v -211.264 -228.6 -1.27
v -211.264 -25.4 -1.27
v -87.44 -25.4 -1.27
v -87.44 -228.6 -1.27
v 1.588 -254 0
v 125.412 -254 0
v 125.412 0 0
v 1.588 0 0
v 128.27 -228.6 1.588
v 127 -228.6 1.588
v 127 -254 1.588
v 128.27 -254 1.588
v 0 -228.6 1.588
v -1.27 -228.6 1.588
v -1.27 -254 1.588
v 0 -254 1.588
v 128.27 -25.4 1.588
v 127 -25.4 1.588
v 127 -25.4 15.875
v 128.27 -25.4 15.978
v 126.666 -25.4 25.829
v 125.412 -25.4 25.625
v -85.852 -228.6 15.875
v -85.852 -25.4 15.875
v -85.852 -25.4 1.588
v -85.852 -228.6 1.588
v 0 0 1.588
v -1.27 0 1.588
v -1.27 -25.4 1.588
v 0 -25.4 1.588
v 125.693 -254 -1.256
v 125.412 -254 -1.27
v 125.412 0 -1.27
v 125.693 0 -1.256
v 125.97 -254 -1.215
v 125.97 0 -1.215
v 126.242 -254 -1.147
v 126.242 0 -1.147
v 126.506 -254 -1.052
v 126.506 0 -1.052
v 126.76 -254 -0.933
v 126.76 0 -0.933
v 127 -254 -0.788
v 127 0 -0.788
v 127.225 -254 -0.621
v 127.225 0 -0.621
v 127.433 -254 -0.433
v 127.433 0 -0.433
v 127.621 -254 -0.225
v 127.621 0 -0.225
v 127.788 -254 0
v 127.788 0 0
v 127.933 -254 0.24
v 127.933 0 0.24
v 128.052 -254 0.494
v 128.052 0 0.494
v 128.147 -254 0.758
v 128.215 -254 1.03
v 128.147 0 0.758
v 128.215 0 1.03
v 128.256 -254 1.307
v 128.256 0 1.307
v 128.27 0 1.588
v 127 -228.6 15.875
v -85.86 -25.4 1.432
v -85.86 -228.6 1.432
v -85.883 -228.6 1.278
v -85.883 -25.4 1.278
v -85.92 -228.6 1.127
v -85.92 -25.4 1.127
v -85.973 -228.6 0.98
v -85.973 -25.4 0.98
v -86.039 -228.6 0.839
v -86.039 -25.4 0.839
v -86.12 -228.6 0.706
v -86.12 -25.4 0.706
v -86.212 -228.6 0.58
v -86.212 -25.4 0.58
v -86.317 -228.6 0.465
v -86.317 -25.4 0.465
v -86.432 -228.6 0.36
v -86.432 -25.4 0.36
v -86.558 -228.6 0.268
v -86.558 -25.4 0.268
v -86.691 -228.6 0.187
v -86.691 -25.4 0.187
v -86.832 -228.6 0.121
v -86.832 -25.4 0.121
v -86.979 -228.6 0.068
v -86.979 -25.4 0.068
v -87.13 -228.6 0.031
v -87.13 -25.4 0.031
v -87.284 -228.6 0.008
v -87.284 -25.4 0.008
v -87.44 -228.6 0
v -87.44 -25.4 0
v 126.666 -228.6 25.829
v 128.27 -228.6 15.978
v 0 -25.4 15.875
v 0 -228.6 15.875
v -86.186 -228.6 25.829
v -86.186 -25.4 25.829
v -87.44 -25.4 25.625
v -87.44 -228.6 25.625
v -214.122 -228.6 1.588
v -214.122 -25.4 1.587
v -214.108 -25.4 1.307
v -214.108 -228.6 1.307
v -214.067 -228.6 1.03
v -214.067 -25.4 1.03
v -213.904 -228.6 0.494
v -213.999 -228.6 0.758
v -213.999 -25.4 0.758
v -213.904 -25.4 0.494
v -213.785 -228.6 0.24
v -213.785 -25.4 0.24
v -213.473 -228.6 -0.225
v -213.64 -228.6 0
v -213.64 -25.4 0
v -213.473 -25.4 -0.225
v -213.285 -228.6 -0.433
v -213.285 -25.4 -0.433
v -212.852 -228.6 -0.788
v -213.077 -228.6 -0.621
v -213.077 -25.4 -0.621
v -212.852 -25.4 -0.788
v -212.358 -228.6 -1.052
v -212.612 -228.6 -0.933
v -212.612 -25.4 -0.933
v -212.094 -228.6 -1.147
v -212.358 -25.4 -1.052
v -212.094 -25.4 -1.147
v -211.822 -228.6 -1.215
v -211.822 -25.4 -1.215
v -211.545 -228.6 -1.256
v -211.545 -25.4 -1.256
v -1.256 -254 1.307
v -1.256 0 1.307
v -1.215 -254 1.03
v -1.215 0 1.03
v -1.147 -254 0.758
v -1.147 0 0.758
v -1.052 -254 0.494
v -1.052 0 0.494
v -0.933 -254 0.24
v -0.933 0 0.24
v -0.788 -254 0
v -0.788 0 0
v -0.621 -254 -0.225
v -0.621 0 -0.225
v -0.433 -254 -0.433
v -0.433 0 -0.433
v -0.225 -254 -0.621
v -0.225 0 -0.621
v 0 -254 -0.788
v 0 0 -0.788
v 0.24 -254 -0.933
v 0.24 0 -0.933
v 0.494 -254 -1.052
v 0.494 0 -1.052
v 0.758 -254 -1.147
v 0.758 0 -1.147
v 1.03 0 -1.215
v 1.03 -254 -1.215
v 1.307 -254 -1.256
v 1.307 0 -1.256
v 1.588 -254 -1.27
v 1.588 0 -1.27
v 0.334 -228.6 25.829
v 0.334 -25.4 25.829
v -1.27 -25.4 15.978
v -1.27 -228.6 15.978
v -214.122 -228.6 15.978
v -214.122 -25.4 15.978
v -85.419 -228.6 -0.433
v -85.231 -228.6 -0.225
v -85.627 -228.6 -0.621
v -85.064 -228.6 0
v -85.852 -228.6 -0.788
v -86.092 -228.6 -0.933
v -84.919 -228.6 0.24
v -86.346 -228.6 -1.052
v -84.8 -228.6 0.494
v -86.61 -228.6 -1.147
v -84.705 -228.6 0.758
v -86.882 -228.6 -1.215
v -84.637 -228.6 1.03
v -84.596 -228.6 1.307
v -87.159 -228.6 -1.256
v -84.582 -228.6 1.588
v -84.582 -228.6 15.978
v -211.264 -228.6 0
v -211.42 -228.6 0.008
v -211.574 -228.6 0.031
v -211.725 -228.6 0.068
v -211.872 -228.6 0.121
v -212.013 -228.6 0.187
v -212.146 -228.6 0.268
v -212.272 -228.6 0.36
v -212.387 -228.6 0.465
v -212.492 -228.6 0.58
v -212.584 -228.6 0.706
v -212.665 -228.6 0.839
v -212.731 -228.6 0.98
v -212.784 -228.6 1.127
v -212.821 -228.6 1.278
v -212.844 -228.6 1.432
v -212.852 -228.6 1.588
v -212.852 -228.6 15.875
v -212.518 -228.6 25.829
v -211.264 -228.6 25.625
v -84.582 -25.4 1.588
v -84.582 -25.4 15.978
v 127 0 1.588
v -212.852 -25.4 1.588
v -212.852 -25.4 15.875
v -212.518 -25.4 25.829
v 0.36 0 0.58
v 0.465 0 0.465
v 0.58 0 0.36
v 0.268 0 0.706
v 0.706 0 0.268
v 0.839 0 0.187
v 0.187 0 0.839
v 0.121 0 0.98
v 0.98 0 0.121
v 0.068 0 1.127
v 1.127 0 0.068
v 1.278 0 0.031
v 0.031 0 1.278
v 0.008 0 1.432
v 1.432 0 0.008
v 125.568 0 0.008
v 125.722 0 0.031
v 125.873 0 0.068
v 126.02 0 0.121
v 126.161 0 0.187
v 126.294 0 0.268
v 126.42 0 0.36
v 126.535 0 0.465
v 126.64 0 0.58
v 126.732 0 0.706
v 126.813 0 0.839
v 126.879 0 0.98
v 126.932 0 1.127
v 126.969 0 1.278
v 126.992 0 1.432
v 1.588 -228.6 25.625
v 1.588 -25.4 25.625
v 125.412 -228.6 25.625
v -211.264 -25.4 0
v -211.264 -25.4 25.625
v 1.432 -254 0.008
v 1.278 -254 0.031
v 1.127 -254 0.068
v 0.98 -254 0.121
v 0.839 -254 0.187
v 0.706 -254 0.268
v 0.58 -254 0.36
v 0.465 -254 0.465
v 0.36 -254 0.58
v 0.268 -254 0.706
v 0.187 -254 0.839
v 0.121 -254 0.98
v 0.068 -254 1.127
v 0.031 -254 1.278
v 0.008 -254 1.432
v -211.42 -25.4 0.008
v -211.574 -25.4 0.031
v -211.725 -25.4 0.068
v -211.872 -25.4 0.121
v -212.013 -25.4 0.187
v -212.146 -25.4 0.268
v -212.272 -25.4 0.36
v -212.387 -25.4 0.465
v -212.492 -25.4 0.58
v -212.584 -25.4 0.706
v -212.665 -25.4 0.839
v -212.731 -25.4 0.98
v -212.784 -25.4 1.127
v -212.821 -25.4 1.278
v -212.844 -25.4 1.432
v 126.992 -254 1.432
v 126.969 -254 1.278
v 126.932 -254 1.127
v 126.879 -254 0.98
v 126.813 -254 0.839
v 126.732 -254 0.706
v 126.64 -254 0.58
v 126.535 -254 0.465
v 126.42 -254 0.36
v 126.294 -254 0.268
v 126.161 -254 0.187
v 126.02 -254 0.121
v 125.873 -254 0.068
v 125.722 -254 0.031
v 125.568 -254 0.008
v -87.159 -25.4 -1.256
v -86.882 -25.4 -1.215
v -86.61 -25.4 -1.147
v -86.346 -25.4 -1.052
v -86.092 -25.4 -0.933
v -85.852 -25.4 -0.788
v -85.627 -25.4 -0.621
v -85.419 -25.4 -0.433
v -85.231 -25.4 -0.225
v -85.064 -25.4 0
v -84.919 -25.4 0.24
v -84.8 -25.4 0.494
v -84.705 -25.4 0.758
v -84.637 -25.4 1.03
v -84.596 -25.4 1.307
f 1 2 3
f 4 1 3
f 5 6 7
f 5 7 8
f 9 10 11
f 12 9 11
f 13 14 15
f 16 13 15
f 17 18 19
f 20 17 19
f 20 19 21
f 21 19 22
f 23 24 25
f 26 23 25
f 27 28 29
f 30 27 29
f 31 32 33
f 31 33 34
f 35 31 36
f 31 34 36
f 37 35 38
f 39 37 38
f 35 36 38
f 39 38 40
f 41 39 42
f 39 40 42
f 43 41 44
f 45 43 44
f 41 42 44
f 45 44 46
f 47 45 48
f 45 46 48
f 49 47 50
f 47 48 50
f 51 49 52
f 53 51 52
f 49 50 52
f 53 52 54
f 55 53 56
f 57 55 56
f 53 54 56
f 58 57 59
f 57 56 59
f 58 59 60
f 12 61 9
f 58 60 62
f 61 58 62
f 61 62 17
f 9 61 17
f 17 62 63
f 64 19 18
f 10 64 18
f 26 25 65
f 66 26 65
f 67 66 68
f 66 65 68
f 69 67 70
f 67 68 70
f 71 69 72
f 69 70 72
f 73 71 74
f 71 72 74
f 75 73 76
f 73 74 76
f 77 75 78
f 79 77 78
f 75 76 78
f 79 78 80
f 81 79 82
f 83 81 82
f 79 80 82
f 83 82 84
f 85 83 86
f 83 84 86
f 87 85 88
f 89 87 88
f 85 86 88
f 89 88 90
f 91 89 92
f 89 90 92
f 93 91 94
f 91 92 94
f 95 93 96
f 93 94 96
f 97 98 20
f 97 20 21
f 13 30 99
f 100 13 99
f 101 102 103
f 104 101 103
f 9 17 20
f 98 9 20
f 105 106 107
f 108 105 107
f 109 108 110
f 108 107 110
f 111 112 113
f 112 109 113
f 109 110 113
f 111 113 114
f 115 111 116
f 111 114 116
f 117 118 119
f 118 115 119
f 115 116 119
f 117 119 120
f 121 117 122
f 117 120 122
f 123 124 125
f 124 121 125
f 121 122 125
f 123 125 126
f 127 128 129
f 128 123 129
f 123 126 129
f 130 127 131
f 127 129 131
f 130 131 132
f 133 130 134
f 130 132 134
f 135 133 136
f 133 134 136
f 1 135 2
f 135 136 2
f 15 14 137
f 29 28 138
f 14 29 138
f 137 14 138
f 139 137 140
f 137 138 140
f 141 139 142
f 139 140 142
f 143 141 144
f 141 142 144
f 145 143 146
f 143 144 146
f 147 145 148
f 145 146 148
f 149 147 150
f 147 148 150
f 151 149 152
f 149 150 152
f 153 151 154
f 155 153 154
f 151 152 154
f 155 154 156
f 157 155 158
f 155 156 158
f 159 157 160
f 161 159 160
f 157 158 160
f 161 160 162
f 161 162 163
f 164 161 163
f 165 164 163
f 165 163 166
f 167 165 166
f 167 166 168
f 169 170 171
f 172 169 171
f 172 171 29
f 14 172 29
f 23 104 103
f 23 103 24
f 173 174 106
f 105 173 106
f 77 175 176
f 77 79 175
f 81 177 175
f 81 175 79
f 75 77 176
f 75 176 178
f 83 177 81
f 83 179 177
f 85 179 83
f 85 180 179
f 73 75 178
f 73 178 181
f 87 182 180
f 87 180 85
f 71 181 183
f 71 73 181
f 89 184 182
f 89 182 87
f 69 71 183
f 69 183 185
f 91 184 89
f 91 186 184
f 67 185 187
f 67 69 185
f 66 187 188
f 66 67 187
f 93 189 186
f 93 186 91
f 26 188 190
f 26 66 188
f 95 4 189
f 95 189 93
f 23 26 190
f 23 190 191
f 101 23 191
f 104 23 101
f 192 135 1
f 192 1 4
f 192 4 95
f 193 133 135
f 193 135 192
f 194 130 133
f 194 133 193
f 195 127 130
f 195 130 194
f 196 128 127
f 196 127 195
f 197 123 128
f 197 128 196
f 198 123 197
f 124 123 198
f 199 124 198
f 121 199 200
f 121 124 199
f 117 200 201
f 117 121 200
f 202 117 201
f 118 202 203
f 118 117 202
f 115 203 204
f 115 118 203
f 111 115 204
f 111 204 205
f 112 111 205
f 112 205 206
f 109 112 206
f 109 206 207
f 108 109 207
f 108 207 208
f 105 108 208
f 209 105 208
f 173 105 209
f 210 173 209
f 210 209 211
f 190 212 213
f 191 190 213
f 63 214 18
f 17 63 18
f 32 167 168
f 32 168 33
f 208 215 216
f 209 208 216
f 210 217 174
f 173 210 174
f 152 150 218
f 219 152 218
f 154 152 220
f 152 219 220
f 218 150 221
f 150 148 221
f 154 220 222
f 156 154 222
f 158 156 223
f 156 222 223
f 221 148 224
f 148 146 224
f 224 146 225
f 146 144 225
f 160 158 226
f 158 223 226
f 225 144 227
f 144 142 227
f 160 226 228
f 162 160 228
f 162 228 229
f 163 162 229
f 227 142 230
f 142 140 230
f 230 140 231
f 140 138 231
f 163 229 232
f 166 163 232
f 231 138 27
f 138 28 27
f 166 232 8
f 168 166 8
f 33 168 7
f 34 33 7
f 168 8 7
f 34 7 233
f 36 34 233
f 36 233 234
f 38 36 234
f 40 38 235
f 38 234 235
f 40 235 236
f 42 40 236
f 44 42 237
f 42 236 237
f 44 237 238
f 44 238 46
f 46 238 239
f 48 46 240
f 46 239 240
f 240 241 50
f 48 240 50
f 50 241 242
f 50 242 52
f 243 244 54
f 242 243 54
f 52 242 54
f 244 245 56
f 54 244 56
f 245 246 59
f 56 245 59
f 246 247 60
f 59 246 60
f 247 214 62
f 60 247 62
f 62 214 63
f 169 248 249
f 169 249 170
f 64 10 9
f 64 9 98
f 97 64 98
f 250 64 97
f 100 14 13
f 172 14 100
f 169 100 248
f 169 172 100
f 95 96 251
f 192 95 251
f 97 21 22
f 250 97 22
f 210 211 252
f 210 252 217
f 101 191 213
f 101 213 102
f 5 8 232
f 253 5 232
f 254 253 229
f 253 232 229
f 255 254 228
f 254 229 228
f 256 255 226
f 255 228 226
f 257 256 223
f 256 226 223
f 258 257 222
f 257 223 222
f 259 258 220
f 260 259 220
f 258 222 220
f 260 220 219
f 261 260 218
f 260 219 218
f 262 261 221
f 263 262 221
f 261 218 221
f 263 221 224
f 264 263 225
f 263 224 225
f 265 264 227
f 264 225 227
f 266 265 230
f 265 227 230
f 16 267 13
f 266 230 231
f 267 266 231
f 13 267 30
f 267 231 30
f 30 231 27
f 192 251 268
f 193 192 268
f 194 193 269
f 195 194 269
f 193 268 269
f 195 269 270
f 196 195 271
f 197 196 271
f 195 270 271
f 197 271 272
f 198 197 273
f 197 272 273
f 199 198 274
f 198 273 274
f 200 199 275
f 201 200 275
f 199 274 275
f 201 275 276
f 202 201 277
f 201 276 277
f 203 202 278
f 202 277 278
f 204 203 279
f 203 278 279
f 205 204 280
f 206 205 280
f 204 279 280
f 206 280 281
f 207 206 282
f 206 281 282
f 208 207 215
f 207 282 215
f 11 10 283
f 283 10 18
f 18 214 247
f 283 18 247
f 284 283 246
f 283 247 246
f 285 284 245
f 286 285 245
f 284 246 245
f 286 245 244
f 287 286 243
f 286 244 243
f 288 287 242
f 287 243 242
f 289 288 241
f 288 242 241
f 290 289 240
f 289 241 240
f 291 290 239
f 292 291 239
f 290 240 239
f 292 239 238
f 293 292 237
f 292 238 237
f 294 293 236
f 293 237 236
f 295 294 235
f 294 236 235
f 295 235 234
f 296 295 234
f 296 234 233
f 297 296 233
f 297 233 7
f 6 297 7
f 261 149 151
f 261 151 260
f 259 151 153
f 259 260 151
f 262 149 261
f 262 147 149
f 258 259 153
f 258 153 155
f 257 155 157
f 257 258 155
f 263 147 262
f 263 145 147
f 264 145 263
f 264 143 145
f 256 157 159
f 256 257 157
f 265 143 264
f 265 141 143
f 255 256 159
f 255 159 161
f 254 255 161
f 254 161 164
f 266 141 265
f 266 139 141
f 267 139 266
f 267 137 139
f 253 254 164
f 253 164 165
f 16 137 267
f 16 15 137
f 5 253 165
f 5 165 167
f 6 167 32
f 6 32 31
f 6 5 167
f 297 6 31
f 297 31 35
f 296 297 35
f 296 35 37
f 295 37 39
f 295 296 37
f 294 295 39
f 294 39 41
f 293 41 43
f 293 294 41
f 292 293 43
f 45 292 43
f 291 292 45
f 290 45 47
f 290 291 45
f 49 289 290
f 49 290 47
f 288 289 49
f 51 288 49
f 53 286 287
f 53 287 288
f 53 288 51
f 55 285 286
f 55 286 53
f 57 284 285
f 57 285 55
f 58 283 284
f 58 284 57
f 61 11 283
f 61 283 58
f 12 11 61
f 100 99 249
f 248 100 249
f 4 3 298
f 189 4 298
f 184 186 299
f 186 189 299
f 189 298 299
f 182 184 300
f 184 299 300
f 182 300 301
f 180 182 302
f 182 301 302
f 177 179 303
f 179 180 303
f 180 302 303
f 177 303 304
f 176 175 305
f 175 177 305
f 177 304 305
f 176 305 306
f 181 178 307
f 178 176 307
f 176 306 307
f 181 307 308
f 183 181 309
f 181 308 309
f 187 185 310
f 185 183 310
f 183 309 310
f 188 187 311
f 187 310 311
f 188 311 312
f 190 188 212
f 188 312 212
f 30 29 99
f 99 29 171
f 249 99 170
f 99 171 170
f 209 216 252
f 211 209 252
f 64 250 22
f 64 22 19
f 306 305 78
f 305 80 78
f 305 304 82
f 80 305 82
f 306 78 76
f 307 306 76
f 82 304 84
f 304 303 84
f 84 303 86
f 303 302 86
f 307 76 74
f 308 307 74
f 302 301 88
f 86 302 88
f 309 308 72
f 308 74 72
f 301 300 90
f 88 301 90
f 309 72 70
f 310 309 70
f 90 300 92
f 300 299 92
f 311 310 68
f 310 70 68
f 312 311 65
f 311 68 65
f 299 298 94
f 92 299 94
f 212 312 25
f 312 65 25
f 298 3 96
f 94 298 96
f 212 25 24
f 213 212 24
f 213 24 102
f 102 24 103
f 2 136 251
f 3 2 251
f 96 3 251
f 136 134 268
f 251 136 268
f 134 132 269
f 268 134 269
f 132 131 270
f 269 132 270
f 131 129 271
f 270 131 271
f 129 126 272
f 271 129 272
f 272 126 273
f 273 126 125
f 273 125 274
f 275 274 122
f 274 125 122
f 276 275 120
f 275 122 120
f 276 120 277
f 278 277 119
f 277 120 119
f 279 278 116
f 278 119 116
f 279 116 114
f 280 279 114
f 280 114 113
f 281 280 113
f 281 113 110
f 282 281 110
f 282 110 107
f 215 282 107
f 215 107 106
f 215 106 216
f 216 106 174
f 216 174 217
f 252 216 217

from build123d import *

# Parameters (mm, degrees)
F1_DEPTH  = 254
F3_DEPTH  = 1.27
F5_DEPTH  = 1.27
F6_W      = 25.4
F6_H      = 24.2419116952
F7_DEPTH  = 129.541
F9_W      = 25.4
F9_H      = 3.5516537219
F9_W_2    = 25.5614472866
F9_H_2    = 3.244402954
F10_DEPTH = 342.393


with BuildPart() as f1:
    # F0 (on Front) → F1 (new body)
    with BuildSketch(Plane.XZ):
        with BuildLine():
            Line((0, 1.5875), (0, 15.875))
            Line((0, 15.875), (1.5875, 25.6253238767))
            Line((1.5875, 25.6253238767), (0.3340056193, 25.8294116952))
            Line((0.3340056193, 25.8294116952), (-1.27, 15.9777113559))
            Line((-1.27, 15.9777113559), (-1.27, 1.5875))
            ThreePointArc((-1.27, 1.5875), (-0.4330576272, -0.4330576272), (1.5875, -1.27))
            Line((1.5875, -1.27), (63.5, -1.27))
            Line((63.5, -1.27), (125.4125, -1.27))
            ThreePointArc((125.4125, -1.27), (127.4330576272, -0.4330576272), (128.27, 1.5875))
            Line((128.27, 1.5875), (128.27, 15.9777113559))
            Line((128.27, 15.9777113559), (126.6659943807, 25.8294116952))
            Line((126.6659943807, 25.8294116952), (125.4125, 25.6253238767))
            Line((125.4125, 25.6253238767), (127, 15.875))
            Line((127, 15.875), (127, 1.5875))
            ThreePointArc((127, 1.5875), (126.5350320151, 0.4649679849), (125.4125, 0))
            Line((125.4125, 0), (63.5, 0))
            Line((63.5, 0), (1.5875, 0))
            ThreePointArc((1.5875, 0), (0.4649679849, 0.4649679849), (0, 1.5875))
        make_face()
    extrude(amount=F1_DEPTH)

    # F2 (on face) → F3 (cut, through all)
    with BuildSketch(Plane(origin=(-3.7714366405, 0, 0.6140468504), x_dir=(0, -1, 0), z_dir=(-0.9870034493, 0, 0.1606990697))):
        with BuildLine():
            ThreePointArc((250.825, 25.5473928299), (253.0700640303, 24.6174568602), (254, 22.3723928299))
            Line((254, 22.3723928299), (254, 25.5473928299))
            Line((254, 25.5473928299), (250.825, 25.5473928299))
        make_face()
        with BuildLine():
            ThreePointArc((0, 22.3723928299), (0.9299359697, 24.6174568602), (3.175, 25.5473928299))
            Line((3.175, 25.5473928299), (0, 25.5473928299))
            Line((0, 25.5473928299), (0, 22.3723928299))
        make_face()
    extrude(amount=-F3_DEPTH, mode=Mode.SUBTRACT)

    # F4 (on face) → F5 (cut, through all)
    with BuildSketch(Plane(origin=(127.4917643851, 0, 20.7575849295), x_dir=(0, 1, 0), z_dir=(0.9870034493, 0, 0.1606990697))):
        with BuildLine():
            ThreePointArc((-254, 1.9636109837), (-253.0700640303, 4.208675014), (-250.825, 5.1386109837))
            Line((-250.825, 5.1386109837), (-254, 5.1386109837))
            Line((-254, 5.1386109837), (-254, 1.9636109837))
        make_face()
        with BuildLine():
            ThreePointArc((-3.175, 5.1386109837), (-0.9299359697, 4.208675014), (0, 1.9636109837))
            Line((0, 1.9636109837), (0, 5.1386109837))
            Line((0, 5.1386109837), (-3.175, 5.1386109837))
        make_face()
    extrude(amount=-F5_DEPTH, mode=Mode.SUBTRACT)

    # F6 (on face) → F7 (cut, through all)
    with BuildSketch(Plane(origin=(-1.27, 0, 0), x_dir=(0, -1, 0), z_dir=(-1, 0, 0))):
        with Locations((12.7, 13.7084558476)):
            Rectangle(F6_W, F6_H)
        with Locations((241.3, 13.7084558476)):
            Rectangle(F6_W, F6_H)
    extrude(amount=-F7_DEPTH, mode=Mode.SUBTRACT)


with BuildPart() as f8_1:
    # F8: copy of F1
    add(f1.part.moved(Location((-212.852, 0, 0))))

    # F9 (on face) → F10 (cut, through all)
    with BuildSketch(Plane(origin=(-214.122, 0, 0), x_dir=(0, -1, 0), z_dir=(-1, 0, 0))):
        with Locations((12.7, -0.188326861)):
            Rectangle(F9_W, F9_H)
        with Locations((241.3807236433, -0.034701477)):
            Rectangle(F9_W_2, F9_H_2)
    extrude(amount=-F10_DEPTH, mode=Mode.SUBTRACT)


solid = Compound([f1.part, f8_1.part])
